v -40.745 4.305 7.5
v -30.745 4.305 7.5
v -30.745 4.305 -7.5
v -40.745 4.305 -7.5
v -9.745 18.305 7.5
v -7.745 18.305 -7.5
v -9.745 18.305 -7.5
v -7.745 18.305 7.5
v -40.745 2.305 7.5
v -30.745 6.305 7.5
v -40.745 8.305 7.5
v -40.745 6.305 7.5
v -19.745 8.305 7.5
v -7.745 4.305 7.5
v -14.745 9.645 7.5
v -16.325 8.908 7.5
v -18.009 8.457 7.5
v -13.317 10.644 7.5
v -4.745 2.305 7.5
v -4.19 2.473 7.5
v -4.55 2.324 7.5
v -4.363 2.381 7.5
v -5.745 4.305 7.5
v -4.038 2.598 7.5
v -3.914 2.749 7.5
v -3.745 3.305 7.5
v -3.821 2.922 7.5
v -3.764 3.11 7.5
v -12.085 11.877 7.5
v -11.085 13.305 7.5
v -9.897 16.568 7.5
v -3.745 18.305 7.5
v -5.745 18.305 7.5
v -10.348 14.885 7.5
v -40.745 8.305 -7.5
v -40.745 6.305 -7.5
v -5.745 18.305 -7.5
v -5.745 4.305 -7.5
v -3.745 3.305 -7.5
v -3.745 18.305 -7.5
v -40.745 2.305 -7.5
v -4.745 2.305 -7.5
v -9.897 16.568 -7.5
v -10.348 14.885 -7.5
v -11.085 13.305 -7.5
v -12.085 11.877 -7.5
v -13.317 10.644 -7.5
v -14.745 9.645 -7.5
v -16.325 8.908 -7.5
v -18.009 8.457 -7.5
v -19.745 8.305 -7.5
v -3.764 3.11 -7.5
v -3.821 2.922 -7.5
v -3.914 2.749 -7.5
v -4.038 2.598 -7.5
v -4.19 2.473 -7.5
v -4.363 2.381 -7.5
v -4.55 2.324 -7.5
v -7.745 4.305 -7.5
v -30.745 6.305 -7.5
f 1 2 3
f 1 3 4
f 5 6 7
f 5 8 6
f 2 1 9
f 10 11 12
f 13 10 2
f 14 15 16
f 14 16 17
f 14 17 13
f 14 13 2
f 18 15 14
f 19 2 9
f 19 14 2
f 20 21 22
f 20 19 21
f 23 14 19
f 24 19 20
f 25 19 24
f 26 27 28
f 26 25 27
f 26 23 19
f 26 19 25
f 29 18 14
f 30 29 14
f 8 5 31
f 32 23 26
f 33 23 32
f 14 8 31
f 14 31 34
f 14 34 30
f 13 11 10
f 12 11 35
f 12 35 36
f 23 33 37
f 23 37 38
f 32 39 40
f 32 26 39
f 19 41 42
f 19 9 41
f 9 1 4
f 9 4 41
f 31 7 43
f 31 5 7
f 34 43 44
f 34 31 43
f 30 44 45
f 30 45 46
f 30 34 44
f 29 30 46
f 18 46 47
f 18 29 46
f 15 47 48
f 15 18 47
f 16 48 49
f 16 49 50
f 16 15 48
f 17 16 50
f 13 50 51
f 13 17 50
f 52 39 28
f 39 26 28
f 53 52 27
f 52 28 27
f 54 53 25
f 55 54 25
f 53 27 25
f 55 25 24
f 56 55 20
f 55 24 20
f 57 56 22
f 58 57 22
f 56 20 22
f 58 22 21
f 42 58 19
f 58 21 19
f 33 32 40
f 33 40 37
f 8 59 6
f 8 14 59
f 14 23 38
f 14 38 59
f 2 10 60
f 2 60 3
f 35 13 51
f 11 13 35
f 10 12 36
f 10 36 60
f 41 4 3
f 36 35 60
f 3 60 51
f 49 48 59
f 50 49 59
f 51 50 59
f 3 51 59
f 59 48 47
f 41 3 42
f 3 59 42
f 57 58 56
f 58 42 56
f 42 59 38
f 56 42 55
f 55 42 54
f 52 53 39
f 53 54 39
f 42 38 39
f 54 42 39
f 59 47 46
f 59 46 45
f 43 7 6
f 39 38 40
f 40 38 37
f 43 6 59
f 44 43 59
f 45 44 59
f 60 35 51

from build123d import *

# Parameters (mm, degrees)
F1_DEPTH = 7.5
F2_R     = 9.99999
F3_R     = 1


# Not quite as in the source:
# - a fillet or chamfer is up to 0.001 mm smaller than in the source, because OpenCascade refuses the exact size


with BuildPart() as f1:
    # F0 (on Top) → F1 (new body, symmetric)
    with BuildSketch(Plane.XY):
        Polygon((-9.7452771891, 18.3048394923), (-9.7452771891, 8.3048394923), (-40.7452771891, 8.3048394923), (-40.7452771891, 6.3048394923), (-30.7452771891, 6.3048394923), (-30.7452771891, 4.3048394923), (-40.7452771891, 4.3048394923), (-40.7452771891, 2.3048394923), (-3.7452771891, 2.3048394923), (-3.7452771891, 18.3048394923), (-5.7452771891, 18.3048394923), (-5.7452771891, 4.3048394923), (-7.7452771891, 4.3048394923), (-7.7452771891, 18.3048394923), align=None)
    extrude(amount=F1_DEPTH, both=True)

    # F2 (radius 10 in the source; OpenCascade refuses exactly that, so slightly less here)
    f2_edges = [f1.edges().sort_by_distance(p)[0] for p in [
        (-9.745277, 8.304839, 0),
    ]]
    fillet(f2_edges, radius=F2_R)

    # F3
    f3_edges = [f1.edges().sort_by_distance(p)[0] for p in [
        (-3.745277, 2.304839, 0),
    ]]
    fillet(f3_edges, radius=F3_R)


solid = f1.part
